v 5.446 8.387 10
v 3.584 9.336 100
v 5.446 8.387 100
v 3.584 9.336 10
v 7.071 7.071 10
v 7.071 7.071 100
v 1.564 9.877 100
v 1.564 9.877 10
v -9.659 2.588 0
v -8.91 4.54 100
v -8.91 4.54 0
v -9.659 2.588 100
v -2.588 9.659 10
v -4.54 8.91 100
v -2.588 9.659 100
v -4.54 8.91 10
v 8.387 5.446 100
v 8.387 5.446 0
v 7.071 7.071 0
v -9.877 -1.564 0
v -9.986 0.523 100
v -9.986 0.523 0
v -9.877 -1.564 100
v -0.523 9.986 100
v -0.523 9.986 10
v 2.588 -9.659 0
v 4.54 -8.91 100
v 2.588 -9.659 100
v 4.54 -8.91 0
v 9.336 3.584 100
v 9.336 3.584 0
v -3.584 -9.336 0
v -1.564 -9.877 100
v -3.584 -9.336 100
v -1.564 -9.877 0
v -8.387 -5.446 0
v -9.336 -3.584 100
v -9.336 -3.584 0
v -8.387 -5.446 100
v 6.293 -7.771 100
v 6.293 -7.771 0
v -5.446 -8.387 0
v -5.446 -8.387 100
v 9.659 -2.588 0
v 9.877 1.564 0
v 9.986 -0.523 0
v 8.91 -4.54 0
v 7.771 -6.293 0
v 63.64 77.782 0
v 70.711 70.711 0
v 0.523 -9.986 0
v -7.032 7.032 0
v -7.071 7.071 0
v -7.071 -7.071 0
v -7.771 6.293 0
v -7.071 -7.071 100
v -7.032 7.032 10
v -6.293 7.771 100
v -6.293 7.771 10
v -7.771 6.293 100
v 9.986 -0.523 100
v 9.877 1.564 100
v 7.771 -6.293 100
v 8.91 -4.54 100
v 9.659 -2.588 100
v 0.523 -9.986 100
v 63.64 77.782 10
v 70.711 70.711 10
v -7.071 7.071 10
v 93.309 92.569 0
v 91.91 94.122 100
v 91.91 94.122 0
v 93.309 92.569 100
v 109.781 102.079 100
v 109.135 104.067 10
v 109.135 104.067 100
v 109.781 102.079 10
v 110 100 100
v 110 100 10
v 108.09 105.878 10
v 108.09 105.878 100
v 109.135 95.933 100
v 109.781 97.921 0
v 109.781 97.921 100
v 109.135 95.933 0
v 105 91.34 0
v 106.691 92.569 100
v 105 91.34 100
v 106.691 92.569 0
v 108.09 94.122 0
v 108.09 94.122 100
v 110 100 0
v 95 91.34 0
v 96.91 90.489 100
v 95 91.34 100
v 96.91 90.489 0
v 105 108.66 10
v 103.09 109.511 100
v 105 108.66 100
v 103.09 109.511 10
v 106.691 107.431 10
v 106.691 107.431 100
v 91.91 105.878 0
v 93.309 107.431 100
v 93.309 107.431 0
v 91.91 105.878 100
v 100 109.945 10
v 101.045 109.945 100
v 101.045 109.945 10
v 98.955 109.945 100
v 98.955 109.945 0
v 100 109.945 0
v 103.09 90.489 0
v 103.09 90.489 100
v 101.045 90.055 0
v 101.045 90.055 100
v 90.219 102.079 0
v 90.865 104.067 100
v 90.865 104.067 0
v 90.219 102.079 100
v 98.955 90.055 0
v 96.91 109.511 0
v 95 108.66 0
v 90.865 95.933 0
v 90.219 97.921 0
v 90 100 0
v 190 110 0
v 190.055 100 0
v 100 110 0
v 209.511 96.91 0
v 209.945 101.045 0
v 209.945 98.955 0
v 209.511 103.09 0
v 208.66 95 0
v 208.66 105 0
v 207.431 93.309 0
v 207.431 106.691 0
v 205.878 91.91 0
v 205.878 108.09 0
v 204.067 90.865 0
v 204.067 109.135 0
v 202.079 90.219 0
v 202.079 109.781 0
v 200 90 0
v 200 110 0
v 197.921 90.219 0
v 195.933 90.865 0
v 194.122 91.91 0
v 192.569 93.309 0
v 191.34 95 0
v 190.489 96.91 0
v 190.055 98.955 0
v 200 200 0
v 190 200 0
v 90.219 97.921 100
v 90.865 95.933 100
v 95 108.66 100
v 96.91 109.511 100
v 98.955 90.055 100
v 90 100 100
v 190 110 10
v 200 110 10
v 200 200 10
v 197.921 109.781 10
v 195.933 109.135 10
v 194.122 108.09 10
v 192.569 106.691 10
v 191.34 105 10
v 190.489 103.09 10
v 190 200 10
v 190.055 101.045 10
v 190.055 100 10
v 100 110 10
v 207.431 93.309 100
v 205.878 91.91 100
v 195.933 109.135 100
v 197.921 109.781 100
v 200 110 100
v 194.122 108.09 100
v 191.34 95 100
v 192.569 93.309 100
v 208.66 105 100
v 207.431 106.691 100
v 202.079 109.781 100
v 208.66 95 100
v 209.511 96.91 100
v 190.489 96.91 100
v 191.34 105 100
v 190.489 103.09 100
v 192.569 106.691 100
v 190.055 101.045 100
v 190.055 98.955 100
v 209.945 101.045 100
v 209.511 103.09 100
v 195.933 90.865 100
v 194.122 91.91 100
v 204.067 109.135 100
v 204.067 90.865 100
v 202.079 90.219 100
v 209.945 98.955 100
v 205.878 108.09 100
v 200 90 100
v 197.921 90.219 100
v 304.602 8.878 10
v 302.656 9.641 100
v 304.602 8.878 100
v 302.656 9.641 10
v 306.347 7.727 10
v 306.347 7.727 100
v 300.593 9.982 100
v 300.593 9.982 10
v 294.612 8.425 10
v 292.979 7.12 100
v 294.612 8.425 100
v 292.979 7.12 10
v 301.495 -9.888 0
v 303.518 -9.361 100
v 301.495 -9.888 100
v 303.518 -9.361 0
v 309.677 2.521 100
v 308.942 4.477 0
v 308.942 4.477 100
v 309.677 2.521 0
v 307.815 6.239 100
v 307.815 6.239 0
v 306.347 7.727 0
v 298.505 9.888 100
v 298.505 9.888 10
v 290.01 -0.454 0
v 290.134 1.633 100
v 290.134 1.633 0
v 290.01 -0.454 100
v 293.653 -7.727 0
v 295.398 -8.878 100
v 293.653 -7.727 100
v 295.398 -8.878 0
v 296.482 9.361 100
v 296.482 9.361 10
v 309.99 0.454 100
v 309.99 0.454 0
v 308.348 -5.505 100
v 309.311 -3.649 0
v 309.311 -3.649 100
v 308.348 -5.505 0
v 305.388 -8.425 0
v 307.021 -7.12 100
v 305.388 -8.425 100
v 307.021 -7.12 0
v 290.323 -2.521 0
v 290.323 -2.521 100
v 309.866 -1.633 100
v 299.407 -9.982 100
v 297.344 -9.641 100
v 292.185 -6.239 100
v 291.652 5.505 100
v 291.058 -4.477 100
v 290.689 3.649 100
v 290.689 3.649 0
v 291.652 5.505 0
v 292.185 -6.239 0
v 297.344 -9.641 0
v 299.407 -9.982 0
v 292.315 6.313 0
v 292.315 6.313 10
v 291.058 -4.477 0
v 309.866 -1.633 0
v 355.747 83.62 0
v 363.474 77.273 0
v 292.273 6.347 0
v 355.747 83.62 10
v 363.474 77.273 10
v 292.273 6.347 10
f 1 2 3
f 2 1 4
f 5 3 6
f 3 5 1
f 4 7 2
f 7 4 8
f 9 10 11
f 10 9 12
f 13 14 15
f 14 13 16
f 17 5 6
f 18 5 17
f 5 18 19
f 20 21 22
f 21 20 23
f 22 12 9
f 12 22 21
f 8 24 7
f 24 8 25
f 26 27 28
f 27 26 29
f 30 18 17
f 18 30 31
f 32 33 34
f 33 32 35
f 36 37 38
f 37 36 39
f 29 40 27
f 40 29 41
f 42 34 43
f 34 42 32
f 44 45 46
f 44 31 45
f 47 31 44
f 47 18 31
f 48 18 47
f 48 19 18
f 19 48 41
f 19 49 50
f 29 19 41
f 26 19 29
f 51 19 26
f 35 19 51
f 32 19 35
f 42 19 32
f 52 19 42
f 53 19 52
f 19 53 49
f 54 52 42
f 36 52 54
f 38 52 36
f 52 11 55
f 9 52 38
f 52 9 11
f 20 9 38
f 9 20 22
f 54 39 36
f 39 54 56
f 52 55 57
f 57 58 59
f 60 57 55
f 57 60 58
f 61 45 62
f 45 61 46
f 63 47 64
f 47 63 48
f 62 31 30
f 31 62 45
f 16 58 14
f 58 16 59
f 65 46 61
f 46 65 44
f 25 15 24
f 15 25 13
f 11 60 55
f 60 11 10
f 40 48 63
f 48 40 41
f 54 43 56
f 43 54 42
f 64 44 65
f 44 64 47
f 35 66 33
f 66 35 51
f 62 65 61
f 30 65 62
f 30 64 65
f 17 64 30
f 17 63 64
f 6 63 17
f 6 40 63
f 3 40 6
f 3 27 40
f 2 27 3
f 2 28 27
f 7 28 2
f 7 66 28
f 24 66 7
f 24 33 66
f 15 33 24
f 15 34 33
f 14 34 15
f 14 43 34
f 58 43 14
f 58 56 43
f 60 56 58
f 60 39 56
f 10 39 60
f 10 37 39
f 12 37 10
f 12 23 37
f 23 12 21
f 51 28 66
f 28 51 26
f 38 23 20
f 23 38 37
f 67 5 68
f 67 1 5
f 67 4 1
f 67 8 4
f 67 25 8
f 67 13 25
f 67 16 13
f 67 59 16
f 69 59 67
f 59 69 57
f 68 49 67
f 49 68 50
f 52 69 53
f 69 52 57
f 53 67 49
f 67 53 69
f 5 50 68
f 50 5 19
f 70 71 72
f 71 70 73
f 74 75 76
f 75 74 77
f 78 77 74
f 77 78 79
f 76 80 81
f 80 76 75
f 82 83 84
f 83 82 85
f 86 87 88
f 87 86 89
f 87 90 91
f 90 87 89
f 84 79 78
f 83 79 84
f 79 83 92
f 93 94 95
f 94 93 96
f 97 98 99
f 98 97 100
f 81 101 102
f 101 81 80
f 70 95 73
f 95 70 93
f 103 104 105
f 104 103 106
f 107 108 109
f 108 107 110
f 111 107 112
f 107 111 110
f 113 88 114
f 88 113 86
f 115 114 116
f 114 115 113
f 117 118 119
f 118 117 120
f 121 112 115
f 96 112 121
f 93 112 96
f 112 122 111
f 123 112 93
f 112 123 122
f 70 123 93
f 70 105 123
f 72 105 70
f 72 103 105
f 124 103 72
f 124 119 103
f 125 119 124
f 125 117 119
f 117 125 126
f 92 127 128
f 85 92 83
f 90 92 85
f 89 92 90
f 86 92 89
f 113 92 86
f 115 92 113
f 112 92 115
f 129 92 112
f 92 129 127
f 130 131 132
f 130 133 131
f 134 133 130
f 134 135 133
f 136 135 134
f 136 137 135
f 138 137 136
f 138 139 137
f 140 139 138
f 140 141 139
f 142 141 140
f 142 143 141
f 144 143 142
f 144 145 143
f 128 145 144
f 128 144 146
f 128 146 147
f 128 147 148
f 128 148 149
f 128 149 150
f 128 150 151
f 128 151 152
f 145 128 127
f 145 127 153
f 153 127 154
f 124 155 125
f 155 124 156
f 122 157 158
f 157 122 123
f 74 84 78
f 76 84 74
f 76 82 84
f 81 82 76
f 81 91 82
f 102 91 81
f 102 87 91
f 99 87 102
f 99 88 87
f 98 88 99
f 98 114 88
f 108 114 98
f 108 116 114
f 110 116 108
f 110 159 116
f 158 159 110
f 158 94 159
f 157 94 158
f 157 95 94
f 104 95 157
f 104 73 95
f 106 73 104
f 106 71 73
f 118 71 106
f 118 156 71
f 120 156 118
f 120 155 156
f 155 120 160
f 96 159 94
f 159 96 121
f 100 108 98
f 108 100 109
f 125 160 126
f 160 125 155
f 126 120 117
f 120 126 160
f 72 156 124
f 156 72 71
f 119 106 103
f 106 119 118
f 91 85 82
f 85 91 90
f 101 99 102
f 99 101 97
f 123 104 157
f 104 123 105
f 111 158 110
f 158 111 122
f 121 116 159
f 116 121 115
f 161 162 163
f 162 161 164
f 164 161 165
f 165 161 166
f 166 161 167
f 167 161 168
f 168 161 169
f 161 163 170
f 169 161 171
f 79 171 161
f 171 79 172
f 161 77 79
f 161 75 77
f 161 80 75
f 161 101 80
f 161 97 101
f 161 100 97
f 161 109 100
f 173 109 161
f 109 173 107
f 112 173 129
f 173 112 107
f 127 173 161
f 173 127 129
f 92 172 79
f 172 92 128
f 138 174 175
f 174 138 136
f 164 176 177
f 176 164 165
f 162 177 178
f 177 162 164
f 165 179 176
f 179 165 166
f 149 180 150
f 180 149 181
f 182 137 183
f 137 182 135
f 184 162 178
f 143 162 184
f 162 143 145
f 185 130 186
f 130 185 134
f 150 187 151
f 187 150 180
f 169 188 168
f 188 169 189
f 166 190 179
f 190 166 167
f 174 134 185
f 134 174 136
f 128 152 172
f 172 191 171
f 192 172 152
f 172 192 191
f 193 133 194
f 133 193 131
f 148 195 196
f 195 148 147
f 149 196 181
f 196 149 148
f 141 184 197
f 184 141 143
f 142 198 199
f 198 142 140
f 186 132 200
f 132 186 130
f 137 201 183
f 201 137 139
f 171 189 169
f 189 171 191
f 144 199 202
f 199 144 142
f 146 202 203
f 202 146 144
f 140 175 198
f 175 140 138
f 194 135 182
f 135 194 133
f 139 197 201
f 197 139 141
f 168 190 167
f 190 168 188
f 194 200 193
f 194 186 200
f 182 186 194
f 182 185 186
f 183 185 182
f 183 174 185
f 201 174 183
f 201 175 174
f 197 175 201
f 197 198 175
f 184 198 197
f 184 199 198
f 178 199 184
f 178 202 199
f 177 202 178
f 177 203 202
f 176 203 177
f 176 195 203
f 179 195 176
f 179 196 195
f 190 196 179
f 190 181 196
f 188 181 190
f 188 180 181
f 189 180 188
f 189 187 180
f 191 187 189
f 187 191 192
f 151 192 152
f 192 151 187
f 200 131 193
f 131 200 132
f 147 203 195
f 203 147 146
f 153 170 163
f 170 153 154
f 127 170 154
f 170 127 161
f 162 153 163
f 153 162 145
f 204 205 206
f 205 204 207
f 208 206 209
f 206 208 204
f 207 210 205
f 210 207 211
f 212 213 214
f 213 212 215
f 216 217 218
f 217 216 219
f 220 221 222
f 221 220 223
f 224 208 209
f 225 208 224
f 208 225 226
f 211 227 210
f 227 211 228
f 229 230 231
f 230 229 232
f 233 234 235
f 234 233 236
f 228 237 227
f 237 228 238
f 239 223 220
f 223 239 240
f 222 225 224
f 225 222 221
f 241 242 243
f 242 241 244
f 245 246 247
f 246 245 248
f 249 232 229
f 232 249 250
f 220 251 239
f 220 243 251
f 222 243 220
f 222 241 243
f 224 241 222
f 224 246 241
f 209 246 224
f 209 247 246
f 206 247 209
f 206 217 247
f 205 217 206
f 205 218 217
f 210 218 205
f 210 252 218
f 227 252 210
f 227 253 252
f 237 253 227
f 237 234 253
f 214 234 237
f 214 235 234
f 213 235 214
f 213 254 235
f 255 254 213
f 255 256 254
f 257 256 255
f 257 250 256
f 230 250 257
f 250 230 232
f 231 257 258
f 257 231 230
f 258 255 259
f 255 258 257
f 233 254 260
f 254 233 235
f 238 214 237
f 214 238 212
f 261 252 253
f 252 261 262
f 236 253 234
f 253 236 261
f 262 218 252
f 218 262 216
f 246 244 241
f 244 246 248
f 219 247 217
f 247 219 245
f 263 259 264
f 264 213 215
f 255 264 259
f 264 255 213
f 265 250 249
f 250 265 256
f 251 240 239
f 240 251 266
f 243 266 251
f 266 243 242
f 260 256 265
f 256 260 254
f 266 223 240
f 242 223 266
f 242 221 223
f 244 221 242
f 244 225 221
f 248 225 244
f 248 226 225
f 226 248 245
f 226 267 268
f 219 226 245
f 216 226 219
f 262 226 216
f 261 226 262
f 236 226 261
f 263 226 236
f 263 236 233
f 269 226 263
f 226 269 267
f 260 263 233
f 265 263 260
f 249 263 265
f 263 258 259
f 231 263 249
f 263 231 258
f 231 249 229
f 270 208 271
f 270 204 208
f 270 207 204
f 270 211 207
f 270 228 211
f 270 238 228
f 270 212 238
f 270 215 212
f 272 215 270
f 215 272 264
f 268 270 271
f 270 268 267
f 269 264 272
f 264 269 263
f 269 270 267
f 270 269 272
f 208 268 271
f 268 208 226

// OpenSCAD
function calc_rotation(a,b) = (
    let (x0=a[0])
    let (y0=a[1])
    let (x1=b[0])
    let (y1=b[1])
    let (xdiff=x1-x0)
    let (ydiff=y1-y0)
    let (rot=atan2(abs(xdiff),abs(ydiff)))
    rot
);

function calc_distance(a,b) = (
    let (x0=a[0])
    let (x1=b[0])
    let (y0=a[1])
    let (y1=b[1])
    let (xpow=pow(abs(x1-x0),2))
    let (ypow=pow(abs(y1-y0),2))
    let (r=sqrt(xpow+ypow))
    r
);

function calc_absolute_offset(a,b) = (
    let (x0=a[0])
    let (x1=b[0])
    let (y0=a[1])
    let (y1=b[1])
    let (xoffset=abs(x1-x0))
    let (yoffset=abs(y1-y0))
    let (offset=[xoffset,yoffset])
    offset
);


module pillar(){
    cylinder(r=10,h=100);
}

// Plank at origin
module Plank(h=0){
    cube([100,10,10]);
}

module Wall(r=0, h=0){
    rotate([0,0,r])
    pillar();
    rotate([0,0,r])
    Plank();
}

xy_array = [[0,0],[100,100],[200,100],[300,0],[320,230]];
plen = len(xy_array);

module PlaceWall(a,b){
    let (offset=calc_absolute_offset(a,b))
    let (rot=calc_rotation(a,offset))
    let (dist=calc_distance(a,b))
    echo (o = offset, d = dist, r = rot)
    translate(a)
    Wall(rot, 2);
}

PlaceWall(a = xy_array[0], b = xy_array[1]);
PlaceWall(a = xy_array[1], b = xy_array[2]);
PlaceWall(a = xy_array[2], b = xy_array[3]);
PlaceWall(a = xy_array[3], b = xy_array[4]);
